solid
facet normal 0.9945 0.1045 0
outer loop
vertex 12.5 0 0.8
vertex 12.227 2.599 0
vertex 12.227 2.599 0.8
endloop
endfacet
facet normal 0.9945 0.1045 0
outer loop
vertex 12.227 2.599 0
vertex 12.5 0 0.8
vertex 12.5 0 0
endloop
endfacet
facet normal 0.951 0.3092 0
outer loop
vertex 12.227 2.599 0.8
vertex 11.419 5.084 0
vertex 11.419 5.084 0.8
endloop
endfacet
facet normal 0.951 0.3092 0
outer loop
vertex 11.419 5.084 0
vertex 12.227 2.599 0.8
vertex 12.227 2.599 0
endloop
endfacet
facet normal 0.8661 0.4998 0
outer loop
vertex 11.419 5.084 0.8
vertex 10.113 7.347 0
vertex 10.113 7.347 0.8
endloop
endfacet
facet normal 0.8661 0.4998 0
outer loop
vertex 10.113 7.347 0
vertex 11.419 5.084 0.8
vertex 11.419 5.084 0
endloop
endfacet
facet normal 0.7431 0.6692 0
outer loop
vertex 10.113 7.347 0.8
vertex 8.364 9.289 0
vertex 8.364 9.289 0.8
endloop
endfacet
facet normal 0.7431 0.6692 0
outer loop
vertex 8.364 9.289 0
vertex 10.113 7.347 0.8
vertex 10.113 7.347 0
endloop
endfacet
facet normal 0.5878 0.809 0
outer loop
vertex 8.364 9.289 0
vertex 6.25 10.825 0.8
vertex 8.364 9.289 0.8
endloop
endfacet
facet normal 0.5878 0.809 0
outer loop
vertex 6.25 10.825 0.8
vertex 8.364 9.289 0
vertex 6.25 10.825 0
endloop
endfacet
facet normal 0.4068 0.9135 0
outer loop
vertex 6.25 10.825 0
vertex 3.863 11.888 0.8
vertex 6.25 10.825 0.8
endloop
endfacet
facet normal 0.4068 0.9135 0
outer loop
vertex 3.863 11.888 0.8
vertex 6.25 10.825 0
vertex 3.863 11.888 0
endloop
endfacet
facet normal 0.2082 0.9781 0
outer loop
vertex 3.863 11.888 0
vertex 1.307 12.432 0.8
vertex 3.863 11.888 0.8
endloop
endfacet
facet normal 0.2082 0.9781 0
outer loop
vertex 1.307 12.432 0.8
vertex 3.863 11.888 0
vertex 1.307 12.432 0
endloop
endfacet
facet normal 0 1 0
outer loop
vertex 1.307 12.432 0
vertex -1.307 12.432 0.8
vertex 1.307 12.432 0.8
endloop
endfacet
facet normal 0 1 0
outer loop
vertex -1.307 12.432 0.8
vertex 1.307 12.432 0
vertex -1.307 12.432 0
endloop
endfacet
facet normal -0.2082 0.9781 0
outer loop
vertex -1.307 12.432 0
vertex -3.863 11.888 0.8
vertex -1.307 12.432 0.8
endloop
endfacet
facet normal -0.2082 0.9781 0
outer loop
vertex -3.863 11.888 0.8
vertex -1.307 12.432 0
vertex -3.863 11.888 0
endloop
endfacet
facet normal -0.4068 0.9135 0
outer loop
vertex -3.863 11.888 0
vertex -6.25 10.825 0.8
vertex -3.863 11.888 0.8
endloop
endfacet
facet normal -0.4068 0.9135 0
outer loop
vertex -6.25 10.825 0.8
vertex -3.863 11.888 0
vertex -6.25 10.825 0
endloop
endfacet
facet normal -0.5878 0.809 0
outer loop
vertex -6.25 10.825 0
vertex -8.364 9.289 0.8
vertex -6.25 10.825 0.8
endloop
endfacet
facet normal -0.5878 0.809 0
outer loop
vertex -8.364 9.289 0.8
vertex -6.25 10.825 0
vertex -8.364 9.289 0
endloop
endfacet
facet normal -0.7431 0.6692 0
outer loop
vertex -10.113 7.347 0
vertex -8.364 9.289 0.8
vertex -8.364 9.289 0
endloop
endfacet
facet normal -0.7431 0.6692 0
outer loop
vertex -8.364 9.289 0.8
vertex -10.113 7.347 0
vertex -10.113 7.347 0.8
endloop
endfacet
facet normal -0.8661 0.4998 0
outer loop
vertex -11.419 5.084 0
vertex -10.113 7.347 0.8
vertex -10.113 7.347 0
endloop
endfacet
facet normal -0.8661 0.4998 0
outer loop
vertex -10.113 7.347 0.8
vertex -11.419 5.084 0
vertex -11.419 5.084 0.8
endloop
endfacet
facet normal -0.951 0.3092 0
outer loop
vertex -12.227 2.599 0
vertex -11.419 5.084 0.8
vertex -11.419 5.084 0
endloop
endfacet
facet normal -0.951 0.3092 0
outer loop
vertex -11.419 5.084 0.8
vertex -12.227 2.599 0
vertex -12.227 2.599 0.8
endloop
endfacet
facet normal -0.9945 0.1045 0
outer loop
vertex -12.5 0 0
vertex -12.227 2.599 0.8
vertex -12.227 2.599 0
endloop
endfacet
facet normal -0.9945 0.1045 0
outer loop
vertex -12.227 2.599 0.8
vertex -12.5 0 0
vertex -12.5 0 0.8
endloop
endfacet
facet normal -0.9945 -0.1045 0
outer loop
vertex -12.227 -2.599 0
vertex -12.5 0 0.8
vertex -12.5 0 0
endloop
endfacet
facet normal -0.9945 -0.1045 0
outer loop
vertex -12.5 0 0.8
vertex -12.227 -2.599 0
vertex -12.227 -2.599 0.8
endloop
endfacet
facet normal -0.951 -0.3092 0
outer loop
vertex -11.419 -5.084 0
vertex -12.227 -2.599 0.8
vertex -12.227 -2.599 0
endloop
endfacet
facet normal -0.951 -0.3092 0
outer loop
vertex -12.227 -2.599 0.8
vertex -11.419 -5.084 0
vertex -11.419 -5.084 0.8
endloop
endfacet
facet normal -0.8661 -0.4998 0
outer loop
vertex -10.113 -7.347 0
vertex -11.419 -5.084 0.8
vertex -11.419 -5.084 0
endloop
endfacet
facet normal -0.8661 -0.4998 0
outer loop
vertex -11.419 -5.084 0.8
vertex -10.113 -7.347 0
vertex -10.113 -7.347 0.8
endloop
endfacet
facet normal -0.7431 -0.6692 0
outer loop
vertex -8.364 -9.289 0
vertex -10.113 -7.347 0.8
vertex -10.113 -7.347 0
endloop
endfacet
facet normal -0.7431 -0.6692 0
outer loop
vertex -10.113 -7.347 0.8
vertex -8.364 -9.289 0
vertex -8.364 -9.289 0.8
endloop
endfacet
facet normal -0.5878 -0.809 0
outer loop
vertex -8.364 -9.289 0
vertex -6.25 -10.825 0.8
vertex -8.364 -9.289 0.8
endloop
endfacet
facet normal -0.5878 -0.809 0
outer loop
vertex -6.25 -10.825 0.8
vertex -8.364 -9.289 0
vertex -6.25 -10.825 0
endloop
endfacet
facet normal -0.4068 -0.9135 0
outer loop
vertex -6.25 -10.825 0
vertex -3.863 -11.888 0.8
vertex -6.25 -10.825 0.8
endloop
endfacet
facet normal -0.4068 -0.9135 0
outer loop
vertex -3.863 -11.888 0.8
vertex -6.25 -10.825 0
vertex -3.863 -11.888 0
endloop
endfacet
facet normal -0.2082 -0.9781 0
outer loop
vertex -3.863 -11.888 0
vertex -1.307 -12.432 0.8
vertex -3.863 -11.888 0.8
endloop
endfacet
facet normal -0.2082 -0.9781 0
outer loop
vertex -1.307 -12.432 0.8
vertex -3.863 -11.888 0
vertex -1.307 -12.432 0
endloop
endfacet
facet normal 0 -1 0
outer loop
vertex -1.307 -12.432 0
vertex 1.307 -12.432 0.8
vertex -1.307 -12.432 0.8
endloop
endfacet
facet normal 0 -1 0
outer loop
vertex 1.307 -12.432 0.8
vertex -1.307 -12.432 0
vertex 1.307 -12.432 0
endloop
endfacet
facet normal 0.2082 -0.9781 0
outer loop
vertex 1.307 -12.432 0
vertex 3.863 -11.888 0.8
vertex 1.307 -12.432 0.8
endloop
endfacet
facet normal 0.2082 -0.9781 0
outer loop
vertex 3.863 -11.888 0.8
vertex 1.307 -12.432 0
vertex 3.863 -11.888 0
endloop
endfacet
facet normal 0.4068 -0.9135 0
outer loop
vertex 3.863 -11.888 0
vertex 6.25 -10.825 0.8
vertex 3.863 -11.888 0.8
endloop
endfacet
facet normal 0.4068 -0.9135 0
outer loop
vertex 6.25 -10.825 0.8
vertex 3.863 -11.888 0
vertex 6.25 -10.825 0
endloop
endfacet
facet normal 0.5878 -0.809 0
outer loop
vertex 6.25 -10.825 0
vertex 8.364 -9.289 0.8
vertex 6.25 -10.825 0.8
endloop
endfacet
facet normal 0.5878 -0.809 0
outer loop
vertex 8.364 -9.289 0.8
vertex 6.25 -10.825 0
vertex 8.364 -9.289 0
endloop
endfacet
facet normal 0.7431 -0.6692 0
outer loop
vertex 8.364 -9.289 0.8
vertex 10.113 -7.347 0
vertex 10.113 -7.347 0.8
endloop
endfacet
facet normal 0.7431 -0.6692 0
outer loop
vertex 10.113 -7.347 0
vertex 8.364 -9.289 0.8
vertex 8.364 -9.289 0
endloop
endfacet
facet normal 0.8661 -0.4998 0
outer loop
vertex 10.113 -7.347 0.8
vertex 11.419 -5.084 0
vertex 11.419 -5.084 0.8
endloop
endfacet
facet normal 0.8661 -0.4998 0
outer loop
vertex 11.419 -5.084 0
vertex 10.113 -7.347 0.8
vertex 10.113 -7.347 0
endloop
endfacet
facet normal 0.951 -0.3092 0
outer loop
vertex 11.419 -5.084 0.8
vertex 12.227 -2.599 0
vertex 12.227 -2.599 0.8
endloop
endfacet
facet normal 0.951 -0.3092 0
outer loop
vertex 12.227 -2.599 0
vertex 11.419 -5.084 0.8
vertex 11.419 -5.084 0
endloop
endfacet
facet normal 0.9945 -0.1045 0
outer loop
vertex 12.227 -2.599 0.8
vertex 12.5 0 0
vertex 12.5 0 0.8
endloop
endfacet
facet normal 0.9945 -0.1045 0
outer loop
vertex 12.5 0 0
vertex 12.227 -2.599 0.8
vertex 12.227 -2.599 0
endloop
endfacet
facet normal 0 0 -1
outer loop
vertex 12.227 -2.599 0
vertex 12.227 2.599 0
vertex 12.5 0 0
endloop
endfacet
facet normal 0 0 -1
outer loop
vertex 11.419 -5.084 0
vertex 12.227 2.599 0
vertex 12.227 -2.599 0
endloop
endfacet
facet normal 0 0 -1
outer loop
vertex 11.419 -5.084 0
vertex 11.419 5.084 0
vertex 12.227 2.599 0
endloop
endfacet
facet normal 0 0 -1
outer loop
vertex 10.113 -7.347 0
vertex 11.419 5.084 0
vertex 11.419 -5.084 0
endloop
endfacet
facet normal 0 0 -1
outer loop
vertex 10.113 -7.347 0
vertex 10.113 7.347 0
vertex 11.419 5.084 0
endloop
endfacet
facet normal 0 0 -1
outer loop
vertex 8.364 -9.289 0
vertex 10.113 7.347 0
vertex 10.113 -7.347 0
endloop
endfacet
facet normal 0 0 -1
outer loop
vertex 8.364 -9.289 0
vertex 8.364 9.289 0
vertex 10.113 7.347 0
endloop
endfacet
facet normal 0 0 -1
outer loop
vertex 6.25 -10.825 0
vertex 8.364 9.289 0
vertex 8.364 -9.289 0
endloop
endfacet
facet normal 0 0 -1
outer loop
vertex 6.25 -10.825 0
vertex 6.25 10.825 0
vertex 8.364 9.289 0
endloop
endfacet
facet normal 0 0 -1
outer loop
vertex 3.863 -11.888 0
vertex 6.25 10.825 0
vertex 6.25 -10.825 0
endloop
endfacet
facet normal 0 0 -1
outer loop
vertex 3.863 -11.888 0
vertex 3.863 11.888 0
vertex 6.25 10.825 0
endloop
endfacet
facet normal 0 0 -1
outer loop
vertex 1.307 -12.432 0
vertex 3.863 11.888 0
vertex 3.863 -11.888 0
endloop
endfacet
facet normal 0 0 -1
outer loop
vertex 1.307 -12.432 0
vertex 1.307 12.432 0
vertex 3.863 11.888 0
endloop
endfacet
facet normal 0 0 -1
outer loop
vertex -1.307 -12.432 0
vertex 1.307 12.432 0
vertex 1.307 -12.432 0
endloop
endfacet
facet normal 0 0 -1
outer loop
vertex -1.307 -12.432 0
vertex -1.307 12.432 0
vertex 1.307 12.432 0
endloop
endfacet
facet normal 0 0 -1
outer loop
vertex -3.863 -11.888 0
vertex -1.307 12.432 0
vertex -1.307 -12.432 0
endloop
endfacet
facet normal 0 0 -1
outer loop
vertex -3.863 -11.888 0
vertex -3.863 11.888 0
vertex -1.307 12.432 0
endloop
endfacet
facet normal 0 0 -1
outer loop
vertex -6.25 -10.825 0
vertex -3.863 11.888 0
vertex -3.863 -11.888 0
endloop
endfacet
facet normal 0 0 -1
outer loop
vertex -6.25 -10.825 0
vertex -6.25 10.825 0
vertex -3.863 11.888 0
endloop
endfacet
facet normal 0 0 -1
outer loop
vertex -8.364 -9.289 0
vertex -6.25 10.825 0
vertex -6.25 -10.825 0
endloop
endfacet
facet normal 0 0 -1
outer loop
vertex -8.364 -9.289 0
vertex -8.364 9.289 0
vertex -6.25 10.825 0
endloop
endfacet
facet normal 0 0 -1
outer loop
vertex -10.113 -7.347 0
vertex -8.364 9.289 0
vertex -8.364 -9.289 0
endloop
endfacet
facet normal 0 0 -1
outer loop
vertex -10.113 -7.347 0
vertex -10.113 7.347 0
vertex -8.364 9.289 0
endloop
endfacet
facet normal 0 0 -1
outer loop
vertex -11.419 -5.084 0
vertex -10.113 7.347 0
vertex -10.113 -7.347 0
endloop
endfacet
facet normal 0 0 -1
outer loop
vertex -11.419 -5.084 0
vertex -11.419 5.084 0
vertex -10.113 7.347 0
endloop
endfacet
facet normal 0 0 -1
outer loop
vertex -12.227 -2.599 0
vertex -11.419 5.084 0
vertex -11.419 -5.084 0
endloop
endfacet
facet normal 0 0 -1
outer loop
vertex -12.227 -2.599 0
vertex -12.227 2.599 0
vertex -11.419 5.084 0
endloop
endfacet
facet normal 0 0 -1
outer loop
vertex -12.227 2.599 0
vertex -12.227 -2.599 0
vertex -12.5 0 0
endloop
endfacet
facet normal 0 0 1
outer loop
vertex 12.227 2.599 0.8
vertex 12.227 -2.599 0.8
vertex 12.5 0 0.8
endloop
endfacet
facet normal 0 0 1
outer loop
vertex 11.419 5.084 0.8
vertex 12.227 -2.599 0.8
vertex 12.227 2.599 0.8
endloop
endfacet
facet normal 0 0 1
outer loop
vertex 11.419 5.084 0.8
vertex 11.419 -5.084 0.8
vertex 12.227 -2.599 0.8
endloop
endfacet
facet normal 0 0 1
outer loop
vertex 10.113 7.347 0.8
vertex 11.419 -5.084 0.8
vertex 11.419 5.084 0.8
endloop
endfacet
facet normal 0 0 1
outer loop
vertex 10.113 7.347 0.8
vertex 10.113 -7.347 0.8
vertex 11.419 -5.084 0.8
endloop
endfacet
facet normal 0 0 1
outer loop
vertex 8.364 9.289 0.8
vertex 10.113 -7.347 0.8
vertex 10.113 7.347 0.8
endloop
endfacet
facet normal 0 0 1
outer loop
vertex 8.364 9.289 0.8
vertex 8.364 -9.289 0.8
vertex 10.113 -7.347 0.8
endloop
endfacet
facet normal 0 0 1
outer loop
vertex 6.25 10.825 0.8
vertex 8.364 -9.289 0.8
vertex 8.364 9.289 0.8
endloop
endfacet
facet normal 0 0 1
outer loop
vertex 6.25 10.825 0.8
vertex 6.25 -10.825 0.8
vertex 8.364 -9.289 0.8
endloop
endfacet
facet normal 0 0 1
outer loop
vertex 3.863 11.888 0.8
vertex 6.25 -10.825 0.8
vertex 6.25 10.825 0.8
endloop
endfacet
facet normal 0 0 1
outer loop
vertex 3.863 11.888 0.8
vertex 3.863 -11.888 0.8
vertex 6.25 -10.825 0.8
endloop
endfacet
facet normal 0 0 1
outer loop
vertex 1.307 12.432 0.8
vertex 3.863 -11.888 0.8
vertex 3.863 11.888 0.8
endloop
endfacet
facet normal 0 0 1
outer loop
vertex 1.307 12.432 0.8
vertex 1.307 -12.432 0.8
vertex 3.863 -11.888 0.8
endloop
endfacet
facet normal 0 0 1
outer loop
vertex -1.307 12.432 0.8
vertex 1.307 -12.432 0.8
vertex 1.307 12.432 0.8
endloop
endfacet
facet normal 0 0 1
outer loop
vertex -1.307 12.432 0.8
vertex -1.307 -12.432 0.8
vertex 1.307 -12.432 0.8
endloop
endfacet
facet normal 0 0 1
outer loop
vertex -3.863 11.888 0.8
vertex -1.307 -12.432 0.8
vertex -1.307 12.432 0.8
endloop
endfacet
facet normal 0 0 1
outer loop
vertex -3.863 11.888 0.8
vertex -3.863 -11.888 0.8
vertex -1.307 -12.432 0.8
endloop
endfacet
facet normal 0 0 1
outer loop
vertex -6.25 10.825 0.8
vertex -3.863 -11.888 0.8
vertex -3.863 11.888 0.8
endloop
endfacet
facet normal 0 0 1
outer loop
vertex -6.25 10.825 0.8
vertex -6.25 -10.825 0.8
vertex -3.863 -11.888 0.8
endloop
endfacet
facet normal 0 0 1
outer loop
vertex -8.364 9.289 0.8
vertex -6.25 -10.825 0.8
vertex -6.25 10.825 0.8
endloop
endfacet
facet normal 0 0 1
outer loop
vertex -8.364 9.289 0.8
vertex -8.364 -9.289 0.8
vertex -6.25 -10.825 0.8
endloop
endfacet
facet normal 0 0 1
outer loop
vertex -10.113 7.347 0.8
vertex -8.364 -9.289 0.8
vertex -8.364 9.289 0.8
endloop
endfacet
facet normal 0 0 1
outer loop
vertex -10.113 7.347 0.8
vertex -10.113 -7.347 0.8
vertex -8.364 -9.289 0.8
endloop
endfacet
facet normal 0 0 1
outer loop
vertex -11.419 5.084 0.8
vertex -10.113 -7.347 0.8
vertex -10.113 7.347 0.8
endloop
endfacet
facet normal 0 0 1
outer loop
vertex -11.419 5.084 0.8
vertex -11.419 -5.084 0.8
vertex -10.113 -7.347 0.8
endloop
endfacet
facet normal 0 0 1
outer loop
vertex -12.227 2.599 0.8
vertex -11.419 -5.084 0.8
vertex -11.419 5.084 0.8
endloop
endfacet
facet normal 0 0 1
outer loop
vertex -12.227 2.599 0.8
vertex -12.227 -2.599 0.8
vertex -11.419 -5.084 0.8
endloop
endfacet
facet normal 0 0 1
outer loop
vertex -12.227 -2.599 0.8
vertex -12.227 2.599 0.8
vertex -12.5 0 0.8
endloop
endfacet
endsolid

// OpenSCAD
baseDiamater = 25;
thickness = 0.8;

cylinder(d=baseDiamater, h=thickness);
